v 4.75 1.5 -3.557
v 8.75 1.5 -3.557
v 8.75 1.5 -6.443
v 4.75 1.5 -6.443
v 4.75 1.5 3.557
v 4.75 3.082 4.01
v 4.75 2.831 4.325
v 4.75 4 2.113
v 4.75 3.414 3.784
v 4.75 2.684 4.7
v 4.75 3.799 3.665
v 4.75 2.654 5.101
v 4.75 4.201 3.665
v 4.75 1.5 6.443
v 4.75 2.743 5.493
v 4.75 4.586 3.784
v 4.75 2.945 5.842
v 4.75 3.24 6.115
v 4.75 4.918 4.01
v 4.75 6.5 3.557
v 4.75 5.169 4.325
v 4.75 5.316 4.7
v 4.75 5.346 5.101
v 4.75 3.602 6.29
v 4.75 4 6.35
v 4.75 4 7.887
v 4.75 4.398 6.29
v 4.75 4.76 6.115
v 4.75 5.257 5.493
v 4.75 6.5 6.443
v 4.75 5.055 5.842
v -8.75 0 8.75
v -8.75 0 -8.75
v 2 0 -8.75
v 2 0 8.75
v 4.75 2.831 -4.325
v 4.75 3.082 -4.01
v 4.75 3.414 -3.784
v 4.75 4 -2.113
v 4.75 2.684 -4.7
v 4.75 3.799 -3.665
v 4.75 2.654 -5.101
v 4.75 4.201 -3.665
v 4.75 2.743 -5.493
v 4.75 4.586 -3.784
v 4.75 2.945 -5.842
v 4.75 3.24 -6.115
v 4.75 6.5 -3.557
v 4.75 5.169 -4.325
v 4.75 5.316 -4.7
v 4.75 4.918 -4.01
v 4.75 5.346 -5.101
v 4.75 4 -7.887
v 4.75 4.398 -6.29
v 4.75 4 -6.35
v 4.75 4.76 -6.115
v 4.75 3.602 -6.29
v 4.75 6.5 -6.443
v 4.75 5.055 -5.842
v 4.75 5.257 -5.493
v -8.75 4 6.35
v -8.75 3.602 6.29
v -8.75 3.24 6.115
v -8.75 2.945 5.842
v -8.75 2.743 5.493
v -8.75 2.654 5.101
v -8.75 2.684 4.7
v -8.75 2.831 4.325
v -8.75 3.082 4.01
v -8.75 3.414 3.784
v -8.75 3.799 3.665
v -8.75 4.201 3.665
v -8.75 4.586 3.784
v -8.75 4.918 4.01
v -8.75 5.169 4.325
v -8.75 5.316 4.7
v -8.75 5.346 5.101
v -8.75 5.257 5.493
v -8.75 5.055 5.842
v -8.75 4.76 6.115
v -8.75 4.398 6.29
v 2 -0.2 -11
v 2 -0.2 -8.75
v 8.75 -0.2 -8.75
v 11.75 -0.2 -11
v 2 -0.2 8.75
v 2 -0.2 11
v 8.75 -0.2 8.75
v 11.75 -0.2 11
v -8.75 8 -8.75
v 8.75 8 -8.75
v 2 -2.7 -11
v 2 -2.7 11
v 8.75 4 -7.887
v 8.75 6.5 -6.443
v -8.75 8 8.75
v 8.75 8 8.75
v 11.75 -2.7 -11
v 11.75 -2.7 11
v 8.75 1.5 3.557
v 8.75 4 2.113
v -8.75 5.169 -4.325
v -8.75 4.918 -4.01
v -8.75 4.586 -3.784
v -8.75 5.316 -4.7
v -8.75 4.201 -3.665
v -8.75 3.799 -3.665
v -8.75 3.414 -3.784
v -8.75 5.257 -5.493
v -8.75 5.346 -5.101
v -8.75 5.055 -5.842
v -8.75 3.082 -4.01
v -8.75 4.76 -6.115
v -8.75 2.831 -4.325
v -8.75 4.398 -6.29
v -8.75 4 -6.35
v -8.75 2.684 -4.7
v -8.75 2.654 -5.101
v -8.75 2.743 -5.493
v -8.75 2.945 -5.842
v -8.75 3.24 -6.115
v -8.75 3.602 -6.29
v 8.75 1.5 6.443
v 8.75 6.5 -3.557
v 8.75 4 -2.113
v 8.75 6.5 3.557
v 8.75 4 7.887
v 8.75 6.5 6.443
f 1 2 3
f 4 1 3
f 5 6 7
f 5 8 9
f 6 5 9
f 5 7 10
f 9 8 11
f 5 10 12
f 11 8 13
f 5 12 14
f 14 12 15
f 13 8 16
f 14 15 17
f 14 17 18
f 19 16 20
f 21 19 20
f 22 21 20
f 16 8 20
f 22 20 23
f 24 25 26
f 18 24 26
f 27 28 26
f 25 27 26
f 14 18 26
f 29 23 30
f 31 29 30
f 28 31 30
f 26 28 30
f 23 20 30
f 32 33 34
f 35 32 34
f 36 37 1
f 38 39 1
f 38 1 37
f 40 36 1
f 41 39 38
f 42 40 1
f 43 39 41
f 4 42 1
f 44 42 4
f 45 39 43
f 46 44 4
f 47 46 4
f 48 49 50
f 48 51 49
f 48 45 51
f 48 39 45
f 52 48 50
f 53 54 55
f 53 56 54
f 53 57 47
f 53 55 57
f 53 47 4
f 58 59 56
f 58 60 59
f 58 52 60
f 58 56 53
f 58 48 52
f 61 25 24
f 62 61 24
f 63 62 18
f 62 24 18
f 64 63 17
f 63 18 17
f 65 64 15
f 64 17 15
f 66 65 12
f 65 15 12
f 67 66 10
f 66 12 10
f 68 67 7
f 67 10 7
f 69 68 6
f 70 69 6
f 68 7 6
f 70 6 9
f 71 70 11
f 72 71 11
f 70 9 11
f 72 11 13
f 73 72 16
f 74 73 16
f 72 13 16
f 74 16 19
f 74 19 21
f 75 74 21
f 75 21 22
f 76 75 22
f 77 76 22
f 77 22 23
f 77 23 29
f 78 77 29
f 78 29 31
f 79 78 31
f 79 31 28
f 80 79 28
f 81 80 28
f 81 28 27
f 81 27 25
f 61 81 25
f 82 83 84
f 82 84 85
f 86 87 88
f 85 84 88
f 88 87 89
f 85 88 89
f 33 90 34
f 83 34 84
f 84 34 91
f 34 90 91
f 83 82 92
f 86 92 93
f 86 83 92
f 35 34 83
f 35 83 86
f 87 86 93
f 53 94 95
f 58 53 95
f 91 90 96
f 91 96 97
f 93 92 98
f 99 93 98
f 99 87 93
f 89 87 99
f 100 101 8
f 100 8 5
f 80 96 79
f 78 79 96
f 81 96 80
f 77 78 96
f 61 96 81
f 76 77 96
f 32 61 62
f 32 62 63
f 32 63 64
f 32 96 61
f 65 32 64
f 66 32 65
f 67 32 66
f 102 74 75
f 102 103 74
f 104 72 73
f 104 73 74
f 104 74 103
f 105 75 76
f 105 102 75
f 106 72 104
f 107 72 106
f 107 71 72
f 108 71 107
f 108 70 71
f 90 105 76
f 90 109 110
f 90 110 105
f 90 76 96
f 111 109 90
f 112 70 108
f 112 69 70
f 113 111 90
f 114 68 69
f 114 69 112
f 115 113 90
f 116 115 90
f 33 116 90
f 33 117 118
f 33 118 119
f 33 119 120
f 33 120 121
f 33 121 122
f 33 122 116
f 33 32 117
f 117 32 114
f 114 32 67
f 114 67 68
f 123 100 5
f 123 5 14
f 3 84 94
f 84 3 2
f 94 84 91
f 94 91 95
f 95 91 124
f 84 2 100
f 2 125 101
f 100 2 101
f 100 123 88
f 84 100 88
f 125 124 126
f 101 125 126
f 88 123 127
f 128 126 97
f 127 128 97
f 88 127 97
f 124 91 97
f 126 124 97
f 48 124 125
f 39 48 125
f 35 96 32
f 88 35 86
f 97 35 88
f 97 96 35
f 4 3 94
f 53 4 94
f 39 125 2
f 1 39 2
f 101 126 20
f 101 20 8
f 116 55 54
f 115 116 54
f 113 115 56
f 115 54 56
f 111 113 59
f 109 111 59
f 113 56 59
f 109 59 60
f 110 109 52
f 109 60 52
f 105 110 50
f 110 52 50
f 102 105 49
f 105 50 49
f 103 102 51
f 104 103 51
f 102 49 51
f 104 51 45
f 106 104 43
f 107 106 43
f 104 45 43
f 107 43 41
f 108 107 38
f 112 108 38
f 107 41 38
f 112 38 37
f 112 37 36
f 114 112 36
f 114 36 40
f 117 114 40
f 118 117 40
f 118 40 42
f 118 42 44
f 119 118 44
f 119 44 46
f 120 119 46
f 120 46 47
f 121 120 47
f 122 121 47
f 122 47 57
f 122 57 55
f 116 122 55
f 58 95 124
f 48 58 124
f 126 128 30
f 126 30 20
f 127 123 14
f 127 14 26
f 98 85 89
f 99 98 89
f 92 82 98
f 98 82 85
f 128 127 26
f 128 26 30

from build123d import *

# Parameters (mm, degrees)
SKETCH_1_W          = 17.5
SKETCH_1_H          = 17.5
EXTRUDE_1_DEPTH     = 8
SKETCH_2_R          = 1.35
CUT_EXTRUDE_1_DEPTH = 22.137939824
CUT_EXTRUDE_2_DEPTH = 4
SKETCH_5_W          = 6.75
SKETCH_5_H          = 17.5
EXTRUDE_3_DEPTH     = 0.2
SKETCH_6_W          = 9.75
SKETCH_6_H          = 22
EXTRUDE_4_DEPTH     = 2.5


with BuildPart() as part:
    # 草图1 → 凸台-拉伸1 (new body)
    with BuildSketch(Plane(origin=(0, 0, 0), x_dir=(1, 0, 0), z_dir=(0, 1, 0))):
        Rectangle(SKETCH_1_W, SKETCH_1_H)
    extrude(amount=EXTRUDE_1_DEPTH)

    # 草图2 → 切除-拉伸1 (cut, through all)
    with BuildSketch(Plane(origin=(8.75, 0, 0), x_dir=(0, 0, -1), z_dir=(1, 0, 0))):
        with Locations((5, 4)):
            Circle(SKETCH_2_R)
        with Locations(Location((-5, 4, 0), (0, 0, 180))):
            Circle(SKETCH_2_R)
    extrude(amount=-CUT_EXTRUDE_1_DEPTH, mode=Mode.SUBTRACT)

    # 草图3 → 切除-拉伸2 (cut)
    with BuildSketch(Plane(origin=(8.75, 0, 0), x_dir=(0, 0, -1), z_dir=(1, 0, 0))):
        Polygon((7.886751346, 4), (6.443375673, 6.5), (3.556624327, 6.5), (2.113248654, 4), (3.556624327, 1.5), (6.443375673, 1.5), align=None)
        Polygon((-6.443375673, 1.5), (-7.886751346, 4), (-6.443375673, 6.5), (-3.556624327, 6.5), (-2.113248654, 4), (-3.556624327, 1.5), align=None)
    extrude(amount=-CUT_EXTRUDE_2_DEPTH, mode=Mode.SUBTRACT)

    # 草图5 → 凸台-拉伸3 (add)
    with BuildSketch(Plane.XZ):
        with Locations((5.375, 0)):
            Rectangle(SKETCH_5_W, SKETCH_5_H)
    extrude(amount=EXTRUDE_3_DEPTH)

    # 草图6 → 凸台-拉伸4 (add)
    with BuildSketch(Plane.XZ.offset(0.2)):
        with Locations((6.875, 0)):
            Rectangle(SKETCH_6_W, SKETCH_6_H)
    extrude(amount=EXTRUDE_4_DEPTH)


solid = part.part
